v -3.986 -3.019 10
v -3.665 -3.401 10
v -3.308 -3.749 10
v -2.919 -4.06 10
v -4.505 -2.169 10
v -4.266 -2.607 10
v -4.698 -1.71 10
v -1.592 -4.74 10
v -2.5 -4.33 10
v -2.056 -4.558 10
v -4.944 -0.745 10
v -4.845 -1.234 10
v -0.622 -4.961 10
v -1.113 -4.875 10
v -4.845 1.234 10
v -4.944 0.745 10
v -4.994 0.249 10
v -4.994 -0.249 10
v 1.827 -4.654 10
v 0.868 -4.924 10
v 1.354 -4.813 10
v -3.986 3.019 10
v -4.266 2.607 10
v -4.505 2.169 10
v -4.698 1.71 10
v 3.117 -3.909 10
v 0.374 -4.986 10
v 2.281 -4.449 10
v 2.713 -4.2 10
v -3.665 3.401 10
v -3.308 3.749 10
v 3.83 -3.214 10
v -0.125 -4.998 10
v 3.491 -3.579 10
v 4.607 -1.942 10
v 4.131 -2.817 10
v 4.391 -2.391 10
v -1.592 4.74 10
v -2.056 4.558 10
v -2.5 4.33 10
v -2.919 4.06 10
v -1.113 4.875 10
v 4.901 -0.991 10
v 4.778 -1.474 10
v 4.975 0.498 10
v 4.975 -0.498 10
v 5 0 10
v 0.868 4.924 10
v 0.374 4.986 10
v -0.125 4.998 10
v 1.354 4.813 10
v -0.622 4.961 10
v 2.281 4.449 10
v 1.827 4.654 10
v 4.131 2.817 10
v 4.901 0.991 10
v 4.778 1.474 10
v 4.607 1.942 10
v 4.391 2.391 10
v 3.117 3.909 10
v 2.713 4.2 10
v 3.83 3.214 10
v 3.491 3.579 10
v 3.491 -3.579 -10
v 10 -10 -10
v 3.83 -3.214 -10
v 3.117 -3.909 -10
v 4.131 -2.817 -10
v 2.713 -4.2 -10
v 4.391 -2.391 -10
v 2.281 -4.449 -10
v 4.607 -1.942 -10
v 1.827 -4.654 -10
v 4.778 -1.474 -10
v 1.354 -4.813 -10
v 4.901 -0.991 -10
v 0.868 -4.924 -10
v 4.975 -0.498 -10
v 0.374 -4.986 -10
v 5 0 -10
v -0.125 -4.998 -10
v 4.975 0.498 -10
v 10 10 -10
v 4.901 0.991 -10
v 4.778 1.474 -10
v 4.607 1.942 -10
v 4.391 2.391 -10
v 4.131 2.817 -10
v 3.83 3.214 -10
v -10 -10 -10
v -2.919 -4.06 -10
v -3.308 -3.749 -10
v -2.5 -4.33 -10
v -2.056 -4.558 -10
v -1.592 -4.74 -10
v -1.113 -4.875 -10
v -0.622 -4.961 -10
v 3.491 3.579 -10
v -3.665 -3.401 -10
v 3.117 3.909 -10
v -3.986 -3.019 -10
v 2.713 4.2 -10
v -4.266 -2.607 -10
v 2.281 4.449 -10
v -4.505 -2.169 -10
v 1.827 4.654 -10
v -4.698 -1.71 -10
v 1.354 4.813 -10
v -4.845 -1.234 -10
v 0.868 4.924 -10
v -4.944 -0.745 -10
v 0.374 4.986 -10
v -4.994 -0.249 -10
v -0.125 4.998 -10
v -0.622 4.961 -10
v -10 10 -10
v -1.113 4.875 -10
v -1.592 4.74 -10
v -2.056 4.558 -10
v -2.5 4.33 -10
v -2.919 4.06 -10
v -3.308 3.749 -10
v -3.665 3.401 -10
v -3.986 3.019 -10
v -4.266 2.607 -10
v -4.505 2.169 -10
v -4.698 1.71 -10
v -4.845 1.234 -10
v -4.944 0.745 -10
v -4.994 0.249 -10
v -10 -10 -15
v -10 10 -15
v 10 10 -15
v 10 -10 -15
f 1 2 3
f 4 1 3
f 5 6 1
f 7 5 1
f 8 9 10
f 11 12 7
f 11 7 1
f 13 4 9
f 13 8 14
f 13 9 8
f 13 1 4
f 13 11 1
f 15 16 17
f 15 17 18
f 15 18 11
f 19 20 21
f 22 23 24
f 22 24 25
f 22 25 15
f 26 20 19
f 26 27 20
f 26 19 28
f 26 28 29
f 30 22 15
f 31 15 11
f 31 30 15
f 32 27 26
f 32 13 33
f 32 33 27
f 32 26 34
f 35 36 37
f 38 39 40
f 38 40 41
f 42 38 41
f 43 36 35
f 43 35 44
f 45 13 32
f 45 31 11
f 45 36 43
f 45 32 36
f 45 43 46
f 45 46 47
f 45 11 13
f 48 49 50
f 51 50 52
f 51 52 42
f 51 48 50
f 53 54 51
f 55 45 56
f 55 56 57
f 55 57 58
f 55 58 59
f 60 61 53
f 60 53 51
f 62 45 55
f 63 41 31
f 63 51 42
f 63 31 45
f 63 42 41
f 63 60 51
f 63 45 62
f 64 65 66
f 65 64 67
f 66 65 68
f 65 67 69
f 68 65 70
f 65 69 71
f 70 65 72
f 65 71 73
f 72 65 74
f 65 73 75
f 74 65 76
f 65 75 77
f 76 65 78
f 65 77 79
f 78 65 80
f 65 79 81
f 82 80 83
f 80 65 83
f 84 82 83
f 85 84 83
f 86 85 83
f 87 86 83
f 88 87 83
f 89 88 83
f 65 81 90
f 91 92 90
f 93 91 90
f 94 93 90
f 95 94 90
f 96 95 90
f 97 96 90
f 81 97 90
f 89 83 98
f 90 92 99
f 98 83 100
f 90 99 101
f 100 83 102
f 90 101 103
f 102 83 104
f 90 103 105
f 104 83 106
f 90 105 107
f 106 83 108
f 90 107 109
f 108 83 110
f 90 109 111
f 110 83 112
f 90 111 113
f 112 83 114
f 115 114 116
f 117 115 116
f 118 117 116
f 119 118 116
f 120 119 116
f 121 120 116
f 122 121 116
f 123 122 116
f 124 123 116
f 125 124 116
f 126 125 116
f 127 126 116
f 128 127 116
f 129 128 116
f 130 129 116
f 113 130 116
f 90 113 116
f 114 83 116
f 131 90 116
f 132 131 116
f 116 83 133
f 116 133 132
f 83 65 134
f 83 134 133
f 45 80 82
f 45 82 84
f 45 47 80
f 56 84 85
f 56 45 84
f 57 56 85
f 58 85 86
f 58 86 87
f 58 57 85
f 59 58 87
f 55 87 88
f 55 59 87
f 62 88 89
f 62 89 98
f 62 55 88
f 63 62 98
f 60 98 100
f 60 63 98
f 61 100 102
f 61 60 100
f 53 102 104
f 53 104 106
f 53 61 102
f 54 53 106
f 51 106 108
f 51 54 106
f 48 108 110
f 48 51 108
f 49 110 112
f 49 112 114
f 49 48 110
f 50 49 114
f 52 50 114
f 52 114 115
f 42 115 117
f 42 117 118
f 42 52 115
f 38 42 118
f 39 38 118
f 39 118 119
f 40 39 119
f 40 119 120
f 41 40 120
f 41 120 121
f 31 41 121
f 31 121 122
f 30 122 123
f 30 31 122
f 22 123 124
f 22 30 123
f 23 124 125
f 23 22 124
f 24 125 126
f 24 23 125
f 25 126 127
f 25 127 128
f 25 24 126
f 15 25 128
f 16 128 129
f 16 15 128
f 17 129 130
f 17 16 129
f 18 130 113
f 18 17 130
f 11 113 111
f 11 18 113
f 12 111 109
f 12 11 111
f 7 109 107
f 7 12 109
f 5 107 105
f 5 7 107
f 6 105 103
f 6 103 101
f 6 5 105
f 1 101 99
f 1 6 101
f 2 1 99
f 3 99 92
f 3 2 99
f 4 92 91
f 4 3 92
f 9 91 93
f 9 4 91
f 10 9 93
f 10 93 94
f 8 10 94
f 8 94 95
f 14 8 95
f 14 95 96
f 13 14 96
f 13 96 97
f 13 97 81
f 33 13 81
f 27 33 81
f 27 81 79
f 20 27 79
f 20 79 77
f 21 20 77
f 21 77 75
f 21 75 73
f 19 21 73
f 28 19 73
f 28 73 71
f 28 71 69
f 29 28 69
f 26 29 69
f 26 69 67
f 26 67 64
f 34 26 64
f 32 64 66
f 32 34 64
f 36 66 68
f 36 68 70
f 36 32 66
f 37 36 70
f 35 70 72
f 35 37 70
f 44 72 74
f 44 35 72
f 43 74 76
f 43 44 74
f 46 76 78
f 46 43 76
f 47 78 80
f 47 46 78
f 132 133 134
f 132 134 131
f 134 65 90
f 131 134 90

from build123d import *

# Parameters (mm, degrees)
SKETCH_1_R      = 5
EXTRUDE_1_DEPTH = 10
SKETCH_2_W      = 20
SKETCH_2_H      = 20
EXTRUDE_2_DEPTH = 5


with BuildPart() as part:
    # 草图1 → 凸台-拉伸1 (new, symmetric)
    with BuildSketch(Plane.XY):
        Circle(SKETCH_1_R)
    extrude(amount=EXTRUDE_1_DEPTH, both=True)

    # 草图2 → 凸台-拉伸2 (add)
    with BuildSketch(Plane(origin=(0, 0, -10), x_dir=(-1, 0, 0), z_dir=(0, 0, -1))):
        Rectangle(SKETCH_2_W, SKETCH_2_H)
    extrude(amount=EXTRUDE_2_DEPTH)


solid = part.part
